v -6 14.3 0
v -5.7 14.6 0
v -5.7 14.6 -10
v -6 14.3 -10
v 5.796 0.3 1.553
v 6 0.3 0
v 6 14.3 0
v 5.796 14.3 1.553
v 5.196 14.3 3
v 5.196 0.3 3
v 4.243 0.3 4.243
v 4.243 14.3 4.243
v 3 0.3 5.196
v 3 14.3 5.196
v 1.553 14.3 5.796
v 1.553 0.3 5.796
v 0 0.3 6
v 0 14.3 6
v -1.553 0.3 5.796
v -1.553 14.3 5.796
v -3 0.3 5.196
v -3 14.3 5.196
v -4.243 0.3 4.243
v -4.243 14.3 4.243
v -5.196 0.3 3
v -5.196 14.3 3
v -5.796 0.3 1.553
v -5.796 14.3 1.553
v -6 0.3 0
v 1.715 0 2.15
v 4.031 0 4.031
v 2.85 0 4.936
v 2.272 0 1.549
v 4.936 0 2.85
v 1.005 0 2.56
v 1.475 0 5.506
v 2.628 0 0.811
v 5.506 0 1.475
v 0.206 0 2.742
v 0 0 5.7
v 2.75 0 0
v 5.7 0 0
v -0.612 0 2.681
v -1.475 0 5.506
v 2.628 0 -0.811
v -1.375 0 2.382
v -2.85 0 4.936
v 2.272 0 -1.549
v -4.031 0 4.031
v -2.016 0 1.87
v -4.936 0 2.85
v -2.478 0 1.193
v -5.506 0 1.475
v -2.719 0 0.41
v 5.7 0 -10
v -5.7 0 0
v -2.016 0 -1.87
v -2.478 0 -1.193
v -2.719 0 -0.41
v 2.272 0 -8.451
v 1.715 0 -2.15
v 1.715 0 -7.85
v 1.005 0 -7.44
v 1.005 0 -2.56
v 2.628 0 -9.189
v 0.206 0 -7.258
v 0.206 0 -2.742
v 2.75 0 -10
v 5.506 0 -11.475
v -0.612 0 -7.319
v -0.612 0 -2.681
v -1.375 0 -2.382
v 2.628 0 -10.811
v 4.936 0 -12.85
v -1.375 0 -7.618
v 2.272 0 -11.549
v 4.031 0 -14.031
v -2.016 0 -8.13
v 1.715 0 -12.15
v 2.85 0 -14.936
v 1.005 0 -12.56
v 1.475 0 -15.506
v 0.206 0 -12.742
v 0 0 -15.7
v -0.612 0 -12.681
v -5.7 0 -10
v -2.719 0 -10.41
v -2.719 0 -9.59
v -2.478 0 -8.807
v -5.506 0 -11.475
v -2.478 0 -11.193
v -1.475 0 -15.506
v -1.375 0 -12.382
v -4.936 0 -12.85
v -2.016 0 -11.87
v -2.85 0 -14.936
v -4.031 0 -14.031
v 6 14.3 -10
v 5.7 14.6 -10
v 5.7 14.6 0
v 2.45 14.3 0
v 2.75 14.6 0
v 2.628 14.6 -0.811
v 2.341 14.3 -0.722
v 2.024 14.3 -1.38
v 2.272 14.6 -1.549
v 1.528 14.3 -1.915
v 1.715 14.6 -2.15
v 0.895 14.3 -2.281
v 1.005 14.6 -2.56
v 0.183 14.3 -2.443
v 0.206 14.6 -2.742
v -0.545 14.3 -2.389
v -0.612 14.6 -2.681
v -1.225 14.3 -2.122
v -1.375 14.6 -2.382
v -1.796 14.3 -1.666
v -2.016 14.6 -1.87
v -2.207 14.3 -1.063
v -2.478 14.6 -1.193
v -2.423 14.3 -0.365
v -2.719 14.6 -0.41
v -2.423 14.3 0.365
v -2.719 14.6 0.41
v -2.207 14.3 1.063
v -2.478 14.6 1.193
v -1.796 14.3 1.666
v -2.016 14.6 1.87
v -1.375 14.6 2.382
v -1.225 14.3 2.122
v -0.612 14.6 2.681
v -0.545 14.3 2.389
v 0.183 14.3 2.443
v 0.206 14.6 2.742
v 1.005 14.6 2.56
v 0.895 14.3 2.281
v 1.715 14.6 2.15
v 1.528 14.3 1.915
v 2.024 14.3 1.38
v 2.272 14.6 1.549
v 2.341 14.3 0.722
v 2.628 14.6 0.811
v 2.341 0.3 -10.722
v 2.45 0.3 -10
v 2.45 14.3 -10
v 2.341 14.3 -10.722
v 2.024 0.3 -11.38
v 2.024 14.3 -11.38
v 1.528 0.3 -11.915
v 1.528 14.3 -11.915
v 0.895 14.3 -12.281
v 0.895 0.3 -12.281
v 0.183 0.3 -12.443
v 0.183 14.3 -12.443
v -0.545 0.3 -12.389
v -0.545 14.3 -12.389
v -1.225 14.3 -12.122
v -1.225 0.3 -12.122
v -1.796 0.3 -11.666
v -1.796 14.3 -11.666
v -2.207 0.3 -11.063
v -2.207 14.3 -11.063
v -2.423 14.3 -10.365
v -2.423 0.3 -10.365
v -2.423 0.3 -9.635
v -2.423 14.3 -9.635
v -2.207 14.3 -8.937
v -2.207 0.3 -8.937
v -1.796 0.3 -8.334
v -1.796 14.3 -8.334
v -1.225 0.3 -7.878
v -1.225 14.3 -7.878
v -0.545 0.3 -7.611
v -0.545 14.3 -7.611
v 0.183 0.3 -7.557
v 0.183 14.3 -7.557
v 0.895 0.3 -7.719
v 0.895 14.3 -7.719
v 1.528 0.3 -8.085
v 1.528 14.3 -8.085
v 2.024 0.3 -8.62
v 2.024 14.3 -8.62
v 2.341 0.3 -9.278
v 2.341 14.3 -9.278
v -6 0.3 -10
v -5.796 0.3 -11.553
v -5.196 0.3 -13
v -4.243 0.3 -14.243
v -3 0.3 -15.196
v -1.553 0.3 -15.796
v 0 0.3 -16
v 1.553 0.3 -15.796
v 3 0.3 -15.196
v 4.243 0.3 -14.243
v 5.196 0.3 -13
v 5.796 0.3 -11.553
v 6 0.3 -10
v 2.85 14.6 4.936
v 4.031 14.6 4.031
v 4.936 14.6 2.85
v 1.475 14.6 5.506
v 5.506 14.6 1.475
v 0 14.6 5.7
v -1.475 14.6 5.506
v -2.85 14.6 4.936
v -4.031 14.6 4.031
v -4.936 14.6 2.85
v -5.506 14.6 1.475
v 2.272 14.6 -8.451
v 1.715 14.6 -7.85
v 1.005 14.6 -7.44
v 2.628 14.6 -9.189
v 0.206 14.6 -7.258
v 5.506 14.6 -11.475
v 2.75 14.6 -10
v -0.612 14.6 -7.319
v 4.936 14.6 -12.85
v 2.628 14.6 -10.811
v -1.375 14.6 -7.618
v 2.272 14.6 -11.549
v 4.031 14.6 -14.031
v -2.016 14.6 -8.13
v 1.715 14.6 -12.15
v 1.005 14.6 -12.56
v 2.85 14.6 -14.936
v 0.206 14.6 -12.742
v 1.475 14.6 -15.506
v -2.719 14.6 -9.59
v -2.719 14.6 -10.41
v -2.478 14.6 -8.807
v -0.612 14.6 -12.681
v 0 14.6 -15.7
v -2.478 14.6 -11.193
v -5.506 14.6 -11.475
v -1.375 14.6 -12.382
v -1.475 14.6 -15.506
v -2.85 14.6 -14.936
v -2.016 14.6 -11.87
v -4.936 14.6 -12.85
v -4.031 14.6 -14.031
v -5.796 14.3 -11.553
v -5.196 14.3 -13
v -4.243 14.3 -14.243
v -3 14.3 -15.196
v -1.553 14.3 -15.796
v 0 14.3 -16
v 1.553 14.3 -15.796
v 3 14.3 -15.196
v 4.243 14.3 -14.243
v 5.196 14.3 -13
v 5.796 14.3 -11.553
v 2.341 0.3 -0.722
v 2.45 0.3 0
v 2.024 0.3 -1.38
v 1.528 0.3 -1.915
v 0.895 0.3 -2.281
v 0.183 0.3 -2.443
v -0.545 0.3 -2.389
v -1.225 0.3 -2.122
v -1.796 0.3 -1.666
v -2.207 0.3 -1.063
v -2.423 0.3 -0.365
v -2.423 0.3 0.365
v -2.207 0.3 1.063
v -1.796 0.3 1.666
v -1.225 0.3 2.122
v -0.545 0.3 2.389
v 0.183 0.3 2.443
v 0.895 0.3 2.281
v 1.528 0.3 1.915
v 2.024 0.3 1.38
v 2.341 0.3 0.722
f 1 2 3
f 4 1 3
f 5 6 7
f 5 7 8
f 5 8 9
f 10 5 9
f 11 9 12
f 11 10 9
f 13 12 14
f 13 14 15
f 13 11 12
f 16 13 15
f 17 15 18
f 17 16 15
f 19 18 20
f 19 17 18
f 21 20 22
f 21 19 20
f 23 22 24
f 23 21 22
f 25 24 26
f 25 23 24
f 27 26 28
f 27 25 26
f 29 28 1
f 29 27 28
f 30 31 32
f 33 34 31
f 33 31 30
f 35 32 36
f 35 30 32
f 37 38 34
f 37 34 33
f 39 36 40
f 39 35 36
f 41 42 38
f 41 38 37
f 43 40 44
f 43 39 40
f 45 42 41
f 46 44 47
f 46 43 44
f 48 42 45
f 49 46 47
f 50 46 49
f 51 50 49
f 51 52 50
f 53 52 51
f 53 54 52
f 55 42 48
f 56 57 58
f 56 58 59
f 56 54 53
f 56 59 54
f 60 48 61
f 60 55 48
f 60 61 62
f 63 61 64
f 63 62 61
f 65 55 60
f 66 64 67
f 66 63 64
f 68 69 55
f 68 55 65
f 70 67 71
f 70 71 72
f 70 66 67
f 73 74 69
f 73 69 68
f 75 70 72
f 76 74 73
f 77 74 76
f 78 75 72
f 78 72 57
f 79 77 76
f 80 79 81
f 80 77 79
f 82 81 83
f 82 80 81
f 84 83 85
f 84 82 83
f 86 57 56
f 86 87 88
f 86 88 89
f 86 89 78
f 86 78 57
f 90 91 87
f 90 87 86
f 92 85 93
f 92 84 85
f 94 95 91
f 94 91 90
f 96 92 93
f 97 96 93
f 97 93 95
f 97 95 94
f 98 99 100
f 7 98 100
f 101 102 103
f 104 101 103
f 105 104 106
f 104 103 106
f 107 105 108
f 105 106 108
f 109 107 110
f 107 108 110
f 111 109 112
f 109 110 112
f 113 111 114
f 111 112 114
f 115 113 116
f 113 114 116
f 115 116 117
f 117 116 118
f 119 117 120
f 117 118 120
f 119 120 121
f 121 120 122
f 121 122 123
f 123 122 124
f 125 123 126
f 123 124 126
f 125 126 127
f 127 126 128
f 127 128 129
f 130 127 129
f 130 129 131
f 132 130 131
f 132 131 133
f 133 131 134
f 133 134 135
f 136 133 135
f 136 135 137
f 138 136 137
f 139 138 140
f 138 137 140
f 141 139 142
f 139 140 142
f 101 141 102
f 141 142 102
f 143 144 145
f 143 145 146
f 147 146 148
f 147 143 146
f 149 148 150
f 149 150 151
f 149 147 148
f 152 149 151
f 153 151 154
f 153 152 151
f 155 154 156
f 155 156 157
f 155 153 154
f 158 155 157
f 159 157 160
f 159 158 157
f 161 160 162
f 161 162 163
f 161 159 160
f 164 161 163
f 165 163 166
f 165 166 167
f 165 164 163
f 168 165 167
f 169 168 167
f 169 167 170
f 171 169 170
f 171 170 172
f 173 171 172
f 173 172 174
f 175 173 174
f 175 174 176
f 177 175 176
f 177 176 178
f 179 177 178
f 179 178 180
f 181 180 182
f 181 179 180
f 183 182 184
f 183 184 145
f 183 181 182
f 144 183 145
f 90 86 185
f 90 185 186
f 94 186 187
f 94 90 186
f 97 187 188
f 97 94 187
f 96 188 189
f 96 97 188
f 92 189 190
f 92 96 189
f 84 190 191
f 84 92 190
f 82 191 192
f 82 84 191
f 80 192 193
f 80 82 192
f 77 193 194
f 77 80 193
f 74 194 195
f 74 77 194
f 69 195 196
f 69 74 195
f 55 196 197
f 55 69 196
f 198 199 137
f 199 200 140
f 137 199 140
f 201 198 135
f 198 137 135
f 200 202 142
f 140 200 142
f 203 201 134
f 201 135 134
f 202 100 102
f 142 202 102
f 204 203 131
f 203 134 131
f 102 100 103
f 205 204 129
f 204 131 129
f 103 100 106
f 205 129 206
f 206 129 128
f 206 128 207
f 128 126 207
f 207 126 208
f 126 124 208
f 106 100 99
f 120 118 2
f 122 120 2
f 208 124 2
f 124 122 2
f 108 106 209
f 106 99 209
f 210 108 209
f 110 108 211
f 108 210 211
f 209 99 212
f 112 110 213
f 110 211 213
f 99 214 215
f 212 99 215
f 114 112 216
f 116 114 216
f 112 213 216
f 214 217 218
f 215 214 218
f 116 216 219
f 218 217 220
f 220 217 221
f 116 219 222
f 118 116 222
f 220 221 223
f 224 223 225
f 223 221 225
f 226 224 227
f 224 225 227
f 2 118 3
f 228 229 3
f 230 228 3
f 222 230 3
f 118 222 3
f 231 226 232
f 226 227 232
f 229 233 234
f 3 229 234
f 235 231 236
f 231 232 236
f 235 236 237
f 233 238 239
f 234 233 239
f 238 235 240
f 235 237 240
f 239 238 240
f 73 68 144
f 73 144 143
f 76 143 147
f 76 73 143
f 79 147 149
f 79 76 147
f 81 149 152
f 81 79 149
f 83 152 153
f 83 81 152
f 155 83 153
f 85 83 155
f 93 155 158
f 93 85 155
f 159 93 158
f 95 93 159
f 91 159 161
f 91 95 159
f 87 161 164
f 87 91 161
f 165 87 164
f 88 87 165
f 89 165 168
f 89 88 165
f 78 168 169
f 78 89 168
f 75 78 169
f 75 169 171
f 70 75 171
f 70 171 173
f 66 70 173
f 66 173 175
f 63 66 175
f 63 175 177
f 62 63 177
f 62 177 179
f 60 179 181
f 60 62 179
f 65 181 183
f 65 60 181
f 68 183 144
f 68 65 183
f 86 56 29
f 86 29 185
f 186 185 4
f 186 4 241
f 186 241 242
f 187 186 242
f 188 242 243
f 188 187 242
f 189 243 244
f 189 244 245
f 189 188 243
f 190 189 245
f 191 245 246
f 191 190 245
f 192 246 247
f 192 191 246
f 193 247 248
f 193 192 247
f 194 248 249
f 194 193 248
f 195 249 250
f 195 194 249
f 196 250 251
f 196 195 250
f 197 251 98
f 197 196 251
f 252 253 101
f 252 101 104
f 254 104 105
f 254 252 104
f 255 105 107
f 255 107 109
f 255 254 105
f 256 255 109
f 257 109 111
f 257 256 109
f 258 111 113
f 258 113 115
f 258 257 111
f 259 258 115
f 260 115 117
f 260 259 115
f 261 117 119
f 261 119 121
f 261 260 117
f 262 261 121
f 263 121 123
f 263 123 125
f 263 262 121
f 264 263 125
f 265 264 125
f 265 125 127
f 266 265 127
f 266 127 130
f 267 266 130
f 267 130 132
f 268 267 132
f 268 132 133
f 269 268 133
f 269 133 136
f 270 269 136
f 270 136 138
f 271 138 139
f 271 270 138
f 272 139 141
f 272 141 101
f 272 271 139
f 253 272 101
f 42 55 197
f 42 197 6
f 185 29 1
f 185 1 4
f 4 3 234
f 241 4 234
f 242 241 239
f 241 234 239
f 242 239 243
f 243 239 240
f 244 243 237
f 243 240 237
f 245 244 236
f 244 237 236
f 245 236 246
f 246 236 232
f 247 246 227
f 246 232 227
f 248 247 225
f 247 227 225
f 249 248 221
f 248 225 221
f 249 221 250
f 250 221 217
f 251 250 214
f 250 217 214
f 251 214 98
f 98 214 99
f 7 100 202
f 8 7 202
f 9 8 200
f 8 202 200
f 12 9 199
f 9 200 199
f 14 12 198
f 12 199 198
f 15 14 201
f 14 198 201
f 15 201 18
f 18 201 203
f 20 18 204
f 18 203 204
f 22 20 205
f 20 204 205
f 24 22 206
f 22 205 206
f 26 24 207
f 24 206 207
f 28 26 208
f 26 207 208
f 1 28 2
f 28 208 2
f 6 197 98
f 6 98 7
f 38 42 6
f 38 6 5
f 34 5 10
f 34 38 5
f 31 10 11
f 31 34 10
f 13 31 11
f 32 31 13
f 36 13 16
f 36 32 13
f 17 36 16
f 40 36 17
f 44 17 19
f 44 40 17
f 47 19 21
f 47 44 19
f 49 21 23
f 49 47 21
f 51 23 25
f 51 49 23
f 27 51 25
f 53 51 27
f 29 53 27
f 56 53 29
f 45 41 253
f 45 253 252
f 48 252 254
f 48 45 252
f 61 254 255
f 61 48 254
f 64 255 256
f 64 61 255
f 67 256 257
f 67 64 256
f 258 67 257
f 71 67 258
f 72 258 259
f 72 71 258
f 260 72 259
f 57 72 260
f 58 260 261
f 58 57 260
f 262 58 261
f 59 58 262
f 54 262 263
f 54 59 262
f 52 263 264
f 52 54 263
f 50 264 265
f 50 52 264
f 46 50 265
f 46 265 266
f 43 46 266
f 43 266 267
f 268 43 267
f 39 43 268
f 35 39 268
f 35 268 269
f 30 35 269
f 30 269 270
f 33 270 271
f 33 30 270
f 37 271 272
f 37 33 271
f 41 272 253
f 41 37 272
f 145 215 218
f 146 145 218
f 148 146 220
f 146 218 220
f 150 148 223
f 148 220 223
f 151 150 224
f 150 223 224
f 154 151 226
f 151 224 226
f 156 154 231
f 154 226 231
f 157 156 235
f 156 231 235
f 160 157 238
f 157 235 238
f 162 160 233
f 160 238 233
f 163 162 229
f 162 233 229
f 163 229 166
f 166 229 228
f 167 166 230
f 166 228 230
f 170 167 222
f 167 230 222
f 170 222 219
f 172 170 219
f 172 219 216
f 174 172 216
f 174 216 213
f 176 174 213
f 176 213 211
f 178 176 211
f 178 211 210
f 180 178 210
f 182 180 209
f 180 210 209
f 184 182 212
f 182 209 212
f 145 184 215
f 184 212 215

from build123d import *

# Parameters (mm, degrees)
SKETCH1_R           = 2.45
BOSS_EXTRUDE1_DEPTH = 14.6
CHAMFER1_SIZE       = 0.3


with BuildPart() as part:
    # Sketch1 → Boss-Extrude1 (new body)
    with BuildSketch(Plane(origin=(0, 0, 0), x_dir=(1, 0, 0), z_dir=(0, 1, 0))):
        with BuildLine():
            Line((-6, 0), (-6, 10))
            ThreePointArc((-6, 10), (0, 16), (6, 10))
            Line((6, 10), (6, 0))
            ThreePointArc((6, 0), (0, -6), (-6, 0))
        make_face()
        Circle(SKETCH1_R, mode=Mode.SUBTRACT)
        with Locations((0, 10)):
            Circle(SKETCH1_R, mode=Mode.SUBTRACT)
    extrude(amount=BOSS_EXTRUDE1_DEPTH)

    # Chamfer1
    chamfer1_edges = [part.edges().sort_by_distance(p)[0] for p in [
        (-2.45, 0, 0),
        (-2.45, 14.6, 0),
        (0, 14.6, -16),
        (-2.45, 0, -10),
        (-2.45, 14.6, -10),
        (-6, 14.6, -5),
        (0, 14.6, 6),
        (-6, 0, -5),
        (0, 0, -16),
        (6, 0, -5),
        (0, 0, 6),
        (6, 14.6, -5),
    ]]
    chamfer(chamfer1_edges, length=CHAMFER1_SIZE)


solid = part.part
